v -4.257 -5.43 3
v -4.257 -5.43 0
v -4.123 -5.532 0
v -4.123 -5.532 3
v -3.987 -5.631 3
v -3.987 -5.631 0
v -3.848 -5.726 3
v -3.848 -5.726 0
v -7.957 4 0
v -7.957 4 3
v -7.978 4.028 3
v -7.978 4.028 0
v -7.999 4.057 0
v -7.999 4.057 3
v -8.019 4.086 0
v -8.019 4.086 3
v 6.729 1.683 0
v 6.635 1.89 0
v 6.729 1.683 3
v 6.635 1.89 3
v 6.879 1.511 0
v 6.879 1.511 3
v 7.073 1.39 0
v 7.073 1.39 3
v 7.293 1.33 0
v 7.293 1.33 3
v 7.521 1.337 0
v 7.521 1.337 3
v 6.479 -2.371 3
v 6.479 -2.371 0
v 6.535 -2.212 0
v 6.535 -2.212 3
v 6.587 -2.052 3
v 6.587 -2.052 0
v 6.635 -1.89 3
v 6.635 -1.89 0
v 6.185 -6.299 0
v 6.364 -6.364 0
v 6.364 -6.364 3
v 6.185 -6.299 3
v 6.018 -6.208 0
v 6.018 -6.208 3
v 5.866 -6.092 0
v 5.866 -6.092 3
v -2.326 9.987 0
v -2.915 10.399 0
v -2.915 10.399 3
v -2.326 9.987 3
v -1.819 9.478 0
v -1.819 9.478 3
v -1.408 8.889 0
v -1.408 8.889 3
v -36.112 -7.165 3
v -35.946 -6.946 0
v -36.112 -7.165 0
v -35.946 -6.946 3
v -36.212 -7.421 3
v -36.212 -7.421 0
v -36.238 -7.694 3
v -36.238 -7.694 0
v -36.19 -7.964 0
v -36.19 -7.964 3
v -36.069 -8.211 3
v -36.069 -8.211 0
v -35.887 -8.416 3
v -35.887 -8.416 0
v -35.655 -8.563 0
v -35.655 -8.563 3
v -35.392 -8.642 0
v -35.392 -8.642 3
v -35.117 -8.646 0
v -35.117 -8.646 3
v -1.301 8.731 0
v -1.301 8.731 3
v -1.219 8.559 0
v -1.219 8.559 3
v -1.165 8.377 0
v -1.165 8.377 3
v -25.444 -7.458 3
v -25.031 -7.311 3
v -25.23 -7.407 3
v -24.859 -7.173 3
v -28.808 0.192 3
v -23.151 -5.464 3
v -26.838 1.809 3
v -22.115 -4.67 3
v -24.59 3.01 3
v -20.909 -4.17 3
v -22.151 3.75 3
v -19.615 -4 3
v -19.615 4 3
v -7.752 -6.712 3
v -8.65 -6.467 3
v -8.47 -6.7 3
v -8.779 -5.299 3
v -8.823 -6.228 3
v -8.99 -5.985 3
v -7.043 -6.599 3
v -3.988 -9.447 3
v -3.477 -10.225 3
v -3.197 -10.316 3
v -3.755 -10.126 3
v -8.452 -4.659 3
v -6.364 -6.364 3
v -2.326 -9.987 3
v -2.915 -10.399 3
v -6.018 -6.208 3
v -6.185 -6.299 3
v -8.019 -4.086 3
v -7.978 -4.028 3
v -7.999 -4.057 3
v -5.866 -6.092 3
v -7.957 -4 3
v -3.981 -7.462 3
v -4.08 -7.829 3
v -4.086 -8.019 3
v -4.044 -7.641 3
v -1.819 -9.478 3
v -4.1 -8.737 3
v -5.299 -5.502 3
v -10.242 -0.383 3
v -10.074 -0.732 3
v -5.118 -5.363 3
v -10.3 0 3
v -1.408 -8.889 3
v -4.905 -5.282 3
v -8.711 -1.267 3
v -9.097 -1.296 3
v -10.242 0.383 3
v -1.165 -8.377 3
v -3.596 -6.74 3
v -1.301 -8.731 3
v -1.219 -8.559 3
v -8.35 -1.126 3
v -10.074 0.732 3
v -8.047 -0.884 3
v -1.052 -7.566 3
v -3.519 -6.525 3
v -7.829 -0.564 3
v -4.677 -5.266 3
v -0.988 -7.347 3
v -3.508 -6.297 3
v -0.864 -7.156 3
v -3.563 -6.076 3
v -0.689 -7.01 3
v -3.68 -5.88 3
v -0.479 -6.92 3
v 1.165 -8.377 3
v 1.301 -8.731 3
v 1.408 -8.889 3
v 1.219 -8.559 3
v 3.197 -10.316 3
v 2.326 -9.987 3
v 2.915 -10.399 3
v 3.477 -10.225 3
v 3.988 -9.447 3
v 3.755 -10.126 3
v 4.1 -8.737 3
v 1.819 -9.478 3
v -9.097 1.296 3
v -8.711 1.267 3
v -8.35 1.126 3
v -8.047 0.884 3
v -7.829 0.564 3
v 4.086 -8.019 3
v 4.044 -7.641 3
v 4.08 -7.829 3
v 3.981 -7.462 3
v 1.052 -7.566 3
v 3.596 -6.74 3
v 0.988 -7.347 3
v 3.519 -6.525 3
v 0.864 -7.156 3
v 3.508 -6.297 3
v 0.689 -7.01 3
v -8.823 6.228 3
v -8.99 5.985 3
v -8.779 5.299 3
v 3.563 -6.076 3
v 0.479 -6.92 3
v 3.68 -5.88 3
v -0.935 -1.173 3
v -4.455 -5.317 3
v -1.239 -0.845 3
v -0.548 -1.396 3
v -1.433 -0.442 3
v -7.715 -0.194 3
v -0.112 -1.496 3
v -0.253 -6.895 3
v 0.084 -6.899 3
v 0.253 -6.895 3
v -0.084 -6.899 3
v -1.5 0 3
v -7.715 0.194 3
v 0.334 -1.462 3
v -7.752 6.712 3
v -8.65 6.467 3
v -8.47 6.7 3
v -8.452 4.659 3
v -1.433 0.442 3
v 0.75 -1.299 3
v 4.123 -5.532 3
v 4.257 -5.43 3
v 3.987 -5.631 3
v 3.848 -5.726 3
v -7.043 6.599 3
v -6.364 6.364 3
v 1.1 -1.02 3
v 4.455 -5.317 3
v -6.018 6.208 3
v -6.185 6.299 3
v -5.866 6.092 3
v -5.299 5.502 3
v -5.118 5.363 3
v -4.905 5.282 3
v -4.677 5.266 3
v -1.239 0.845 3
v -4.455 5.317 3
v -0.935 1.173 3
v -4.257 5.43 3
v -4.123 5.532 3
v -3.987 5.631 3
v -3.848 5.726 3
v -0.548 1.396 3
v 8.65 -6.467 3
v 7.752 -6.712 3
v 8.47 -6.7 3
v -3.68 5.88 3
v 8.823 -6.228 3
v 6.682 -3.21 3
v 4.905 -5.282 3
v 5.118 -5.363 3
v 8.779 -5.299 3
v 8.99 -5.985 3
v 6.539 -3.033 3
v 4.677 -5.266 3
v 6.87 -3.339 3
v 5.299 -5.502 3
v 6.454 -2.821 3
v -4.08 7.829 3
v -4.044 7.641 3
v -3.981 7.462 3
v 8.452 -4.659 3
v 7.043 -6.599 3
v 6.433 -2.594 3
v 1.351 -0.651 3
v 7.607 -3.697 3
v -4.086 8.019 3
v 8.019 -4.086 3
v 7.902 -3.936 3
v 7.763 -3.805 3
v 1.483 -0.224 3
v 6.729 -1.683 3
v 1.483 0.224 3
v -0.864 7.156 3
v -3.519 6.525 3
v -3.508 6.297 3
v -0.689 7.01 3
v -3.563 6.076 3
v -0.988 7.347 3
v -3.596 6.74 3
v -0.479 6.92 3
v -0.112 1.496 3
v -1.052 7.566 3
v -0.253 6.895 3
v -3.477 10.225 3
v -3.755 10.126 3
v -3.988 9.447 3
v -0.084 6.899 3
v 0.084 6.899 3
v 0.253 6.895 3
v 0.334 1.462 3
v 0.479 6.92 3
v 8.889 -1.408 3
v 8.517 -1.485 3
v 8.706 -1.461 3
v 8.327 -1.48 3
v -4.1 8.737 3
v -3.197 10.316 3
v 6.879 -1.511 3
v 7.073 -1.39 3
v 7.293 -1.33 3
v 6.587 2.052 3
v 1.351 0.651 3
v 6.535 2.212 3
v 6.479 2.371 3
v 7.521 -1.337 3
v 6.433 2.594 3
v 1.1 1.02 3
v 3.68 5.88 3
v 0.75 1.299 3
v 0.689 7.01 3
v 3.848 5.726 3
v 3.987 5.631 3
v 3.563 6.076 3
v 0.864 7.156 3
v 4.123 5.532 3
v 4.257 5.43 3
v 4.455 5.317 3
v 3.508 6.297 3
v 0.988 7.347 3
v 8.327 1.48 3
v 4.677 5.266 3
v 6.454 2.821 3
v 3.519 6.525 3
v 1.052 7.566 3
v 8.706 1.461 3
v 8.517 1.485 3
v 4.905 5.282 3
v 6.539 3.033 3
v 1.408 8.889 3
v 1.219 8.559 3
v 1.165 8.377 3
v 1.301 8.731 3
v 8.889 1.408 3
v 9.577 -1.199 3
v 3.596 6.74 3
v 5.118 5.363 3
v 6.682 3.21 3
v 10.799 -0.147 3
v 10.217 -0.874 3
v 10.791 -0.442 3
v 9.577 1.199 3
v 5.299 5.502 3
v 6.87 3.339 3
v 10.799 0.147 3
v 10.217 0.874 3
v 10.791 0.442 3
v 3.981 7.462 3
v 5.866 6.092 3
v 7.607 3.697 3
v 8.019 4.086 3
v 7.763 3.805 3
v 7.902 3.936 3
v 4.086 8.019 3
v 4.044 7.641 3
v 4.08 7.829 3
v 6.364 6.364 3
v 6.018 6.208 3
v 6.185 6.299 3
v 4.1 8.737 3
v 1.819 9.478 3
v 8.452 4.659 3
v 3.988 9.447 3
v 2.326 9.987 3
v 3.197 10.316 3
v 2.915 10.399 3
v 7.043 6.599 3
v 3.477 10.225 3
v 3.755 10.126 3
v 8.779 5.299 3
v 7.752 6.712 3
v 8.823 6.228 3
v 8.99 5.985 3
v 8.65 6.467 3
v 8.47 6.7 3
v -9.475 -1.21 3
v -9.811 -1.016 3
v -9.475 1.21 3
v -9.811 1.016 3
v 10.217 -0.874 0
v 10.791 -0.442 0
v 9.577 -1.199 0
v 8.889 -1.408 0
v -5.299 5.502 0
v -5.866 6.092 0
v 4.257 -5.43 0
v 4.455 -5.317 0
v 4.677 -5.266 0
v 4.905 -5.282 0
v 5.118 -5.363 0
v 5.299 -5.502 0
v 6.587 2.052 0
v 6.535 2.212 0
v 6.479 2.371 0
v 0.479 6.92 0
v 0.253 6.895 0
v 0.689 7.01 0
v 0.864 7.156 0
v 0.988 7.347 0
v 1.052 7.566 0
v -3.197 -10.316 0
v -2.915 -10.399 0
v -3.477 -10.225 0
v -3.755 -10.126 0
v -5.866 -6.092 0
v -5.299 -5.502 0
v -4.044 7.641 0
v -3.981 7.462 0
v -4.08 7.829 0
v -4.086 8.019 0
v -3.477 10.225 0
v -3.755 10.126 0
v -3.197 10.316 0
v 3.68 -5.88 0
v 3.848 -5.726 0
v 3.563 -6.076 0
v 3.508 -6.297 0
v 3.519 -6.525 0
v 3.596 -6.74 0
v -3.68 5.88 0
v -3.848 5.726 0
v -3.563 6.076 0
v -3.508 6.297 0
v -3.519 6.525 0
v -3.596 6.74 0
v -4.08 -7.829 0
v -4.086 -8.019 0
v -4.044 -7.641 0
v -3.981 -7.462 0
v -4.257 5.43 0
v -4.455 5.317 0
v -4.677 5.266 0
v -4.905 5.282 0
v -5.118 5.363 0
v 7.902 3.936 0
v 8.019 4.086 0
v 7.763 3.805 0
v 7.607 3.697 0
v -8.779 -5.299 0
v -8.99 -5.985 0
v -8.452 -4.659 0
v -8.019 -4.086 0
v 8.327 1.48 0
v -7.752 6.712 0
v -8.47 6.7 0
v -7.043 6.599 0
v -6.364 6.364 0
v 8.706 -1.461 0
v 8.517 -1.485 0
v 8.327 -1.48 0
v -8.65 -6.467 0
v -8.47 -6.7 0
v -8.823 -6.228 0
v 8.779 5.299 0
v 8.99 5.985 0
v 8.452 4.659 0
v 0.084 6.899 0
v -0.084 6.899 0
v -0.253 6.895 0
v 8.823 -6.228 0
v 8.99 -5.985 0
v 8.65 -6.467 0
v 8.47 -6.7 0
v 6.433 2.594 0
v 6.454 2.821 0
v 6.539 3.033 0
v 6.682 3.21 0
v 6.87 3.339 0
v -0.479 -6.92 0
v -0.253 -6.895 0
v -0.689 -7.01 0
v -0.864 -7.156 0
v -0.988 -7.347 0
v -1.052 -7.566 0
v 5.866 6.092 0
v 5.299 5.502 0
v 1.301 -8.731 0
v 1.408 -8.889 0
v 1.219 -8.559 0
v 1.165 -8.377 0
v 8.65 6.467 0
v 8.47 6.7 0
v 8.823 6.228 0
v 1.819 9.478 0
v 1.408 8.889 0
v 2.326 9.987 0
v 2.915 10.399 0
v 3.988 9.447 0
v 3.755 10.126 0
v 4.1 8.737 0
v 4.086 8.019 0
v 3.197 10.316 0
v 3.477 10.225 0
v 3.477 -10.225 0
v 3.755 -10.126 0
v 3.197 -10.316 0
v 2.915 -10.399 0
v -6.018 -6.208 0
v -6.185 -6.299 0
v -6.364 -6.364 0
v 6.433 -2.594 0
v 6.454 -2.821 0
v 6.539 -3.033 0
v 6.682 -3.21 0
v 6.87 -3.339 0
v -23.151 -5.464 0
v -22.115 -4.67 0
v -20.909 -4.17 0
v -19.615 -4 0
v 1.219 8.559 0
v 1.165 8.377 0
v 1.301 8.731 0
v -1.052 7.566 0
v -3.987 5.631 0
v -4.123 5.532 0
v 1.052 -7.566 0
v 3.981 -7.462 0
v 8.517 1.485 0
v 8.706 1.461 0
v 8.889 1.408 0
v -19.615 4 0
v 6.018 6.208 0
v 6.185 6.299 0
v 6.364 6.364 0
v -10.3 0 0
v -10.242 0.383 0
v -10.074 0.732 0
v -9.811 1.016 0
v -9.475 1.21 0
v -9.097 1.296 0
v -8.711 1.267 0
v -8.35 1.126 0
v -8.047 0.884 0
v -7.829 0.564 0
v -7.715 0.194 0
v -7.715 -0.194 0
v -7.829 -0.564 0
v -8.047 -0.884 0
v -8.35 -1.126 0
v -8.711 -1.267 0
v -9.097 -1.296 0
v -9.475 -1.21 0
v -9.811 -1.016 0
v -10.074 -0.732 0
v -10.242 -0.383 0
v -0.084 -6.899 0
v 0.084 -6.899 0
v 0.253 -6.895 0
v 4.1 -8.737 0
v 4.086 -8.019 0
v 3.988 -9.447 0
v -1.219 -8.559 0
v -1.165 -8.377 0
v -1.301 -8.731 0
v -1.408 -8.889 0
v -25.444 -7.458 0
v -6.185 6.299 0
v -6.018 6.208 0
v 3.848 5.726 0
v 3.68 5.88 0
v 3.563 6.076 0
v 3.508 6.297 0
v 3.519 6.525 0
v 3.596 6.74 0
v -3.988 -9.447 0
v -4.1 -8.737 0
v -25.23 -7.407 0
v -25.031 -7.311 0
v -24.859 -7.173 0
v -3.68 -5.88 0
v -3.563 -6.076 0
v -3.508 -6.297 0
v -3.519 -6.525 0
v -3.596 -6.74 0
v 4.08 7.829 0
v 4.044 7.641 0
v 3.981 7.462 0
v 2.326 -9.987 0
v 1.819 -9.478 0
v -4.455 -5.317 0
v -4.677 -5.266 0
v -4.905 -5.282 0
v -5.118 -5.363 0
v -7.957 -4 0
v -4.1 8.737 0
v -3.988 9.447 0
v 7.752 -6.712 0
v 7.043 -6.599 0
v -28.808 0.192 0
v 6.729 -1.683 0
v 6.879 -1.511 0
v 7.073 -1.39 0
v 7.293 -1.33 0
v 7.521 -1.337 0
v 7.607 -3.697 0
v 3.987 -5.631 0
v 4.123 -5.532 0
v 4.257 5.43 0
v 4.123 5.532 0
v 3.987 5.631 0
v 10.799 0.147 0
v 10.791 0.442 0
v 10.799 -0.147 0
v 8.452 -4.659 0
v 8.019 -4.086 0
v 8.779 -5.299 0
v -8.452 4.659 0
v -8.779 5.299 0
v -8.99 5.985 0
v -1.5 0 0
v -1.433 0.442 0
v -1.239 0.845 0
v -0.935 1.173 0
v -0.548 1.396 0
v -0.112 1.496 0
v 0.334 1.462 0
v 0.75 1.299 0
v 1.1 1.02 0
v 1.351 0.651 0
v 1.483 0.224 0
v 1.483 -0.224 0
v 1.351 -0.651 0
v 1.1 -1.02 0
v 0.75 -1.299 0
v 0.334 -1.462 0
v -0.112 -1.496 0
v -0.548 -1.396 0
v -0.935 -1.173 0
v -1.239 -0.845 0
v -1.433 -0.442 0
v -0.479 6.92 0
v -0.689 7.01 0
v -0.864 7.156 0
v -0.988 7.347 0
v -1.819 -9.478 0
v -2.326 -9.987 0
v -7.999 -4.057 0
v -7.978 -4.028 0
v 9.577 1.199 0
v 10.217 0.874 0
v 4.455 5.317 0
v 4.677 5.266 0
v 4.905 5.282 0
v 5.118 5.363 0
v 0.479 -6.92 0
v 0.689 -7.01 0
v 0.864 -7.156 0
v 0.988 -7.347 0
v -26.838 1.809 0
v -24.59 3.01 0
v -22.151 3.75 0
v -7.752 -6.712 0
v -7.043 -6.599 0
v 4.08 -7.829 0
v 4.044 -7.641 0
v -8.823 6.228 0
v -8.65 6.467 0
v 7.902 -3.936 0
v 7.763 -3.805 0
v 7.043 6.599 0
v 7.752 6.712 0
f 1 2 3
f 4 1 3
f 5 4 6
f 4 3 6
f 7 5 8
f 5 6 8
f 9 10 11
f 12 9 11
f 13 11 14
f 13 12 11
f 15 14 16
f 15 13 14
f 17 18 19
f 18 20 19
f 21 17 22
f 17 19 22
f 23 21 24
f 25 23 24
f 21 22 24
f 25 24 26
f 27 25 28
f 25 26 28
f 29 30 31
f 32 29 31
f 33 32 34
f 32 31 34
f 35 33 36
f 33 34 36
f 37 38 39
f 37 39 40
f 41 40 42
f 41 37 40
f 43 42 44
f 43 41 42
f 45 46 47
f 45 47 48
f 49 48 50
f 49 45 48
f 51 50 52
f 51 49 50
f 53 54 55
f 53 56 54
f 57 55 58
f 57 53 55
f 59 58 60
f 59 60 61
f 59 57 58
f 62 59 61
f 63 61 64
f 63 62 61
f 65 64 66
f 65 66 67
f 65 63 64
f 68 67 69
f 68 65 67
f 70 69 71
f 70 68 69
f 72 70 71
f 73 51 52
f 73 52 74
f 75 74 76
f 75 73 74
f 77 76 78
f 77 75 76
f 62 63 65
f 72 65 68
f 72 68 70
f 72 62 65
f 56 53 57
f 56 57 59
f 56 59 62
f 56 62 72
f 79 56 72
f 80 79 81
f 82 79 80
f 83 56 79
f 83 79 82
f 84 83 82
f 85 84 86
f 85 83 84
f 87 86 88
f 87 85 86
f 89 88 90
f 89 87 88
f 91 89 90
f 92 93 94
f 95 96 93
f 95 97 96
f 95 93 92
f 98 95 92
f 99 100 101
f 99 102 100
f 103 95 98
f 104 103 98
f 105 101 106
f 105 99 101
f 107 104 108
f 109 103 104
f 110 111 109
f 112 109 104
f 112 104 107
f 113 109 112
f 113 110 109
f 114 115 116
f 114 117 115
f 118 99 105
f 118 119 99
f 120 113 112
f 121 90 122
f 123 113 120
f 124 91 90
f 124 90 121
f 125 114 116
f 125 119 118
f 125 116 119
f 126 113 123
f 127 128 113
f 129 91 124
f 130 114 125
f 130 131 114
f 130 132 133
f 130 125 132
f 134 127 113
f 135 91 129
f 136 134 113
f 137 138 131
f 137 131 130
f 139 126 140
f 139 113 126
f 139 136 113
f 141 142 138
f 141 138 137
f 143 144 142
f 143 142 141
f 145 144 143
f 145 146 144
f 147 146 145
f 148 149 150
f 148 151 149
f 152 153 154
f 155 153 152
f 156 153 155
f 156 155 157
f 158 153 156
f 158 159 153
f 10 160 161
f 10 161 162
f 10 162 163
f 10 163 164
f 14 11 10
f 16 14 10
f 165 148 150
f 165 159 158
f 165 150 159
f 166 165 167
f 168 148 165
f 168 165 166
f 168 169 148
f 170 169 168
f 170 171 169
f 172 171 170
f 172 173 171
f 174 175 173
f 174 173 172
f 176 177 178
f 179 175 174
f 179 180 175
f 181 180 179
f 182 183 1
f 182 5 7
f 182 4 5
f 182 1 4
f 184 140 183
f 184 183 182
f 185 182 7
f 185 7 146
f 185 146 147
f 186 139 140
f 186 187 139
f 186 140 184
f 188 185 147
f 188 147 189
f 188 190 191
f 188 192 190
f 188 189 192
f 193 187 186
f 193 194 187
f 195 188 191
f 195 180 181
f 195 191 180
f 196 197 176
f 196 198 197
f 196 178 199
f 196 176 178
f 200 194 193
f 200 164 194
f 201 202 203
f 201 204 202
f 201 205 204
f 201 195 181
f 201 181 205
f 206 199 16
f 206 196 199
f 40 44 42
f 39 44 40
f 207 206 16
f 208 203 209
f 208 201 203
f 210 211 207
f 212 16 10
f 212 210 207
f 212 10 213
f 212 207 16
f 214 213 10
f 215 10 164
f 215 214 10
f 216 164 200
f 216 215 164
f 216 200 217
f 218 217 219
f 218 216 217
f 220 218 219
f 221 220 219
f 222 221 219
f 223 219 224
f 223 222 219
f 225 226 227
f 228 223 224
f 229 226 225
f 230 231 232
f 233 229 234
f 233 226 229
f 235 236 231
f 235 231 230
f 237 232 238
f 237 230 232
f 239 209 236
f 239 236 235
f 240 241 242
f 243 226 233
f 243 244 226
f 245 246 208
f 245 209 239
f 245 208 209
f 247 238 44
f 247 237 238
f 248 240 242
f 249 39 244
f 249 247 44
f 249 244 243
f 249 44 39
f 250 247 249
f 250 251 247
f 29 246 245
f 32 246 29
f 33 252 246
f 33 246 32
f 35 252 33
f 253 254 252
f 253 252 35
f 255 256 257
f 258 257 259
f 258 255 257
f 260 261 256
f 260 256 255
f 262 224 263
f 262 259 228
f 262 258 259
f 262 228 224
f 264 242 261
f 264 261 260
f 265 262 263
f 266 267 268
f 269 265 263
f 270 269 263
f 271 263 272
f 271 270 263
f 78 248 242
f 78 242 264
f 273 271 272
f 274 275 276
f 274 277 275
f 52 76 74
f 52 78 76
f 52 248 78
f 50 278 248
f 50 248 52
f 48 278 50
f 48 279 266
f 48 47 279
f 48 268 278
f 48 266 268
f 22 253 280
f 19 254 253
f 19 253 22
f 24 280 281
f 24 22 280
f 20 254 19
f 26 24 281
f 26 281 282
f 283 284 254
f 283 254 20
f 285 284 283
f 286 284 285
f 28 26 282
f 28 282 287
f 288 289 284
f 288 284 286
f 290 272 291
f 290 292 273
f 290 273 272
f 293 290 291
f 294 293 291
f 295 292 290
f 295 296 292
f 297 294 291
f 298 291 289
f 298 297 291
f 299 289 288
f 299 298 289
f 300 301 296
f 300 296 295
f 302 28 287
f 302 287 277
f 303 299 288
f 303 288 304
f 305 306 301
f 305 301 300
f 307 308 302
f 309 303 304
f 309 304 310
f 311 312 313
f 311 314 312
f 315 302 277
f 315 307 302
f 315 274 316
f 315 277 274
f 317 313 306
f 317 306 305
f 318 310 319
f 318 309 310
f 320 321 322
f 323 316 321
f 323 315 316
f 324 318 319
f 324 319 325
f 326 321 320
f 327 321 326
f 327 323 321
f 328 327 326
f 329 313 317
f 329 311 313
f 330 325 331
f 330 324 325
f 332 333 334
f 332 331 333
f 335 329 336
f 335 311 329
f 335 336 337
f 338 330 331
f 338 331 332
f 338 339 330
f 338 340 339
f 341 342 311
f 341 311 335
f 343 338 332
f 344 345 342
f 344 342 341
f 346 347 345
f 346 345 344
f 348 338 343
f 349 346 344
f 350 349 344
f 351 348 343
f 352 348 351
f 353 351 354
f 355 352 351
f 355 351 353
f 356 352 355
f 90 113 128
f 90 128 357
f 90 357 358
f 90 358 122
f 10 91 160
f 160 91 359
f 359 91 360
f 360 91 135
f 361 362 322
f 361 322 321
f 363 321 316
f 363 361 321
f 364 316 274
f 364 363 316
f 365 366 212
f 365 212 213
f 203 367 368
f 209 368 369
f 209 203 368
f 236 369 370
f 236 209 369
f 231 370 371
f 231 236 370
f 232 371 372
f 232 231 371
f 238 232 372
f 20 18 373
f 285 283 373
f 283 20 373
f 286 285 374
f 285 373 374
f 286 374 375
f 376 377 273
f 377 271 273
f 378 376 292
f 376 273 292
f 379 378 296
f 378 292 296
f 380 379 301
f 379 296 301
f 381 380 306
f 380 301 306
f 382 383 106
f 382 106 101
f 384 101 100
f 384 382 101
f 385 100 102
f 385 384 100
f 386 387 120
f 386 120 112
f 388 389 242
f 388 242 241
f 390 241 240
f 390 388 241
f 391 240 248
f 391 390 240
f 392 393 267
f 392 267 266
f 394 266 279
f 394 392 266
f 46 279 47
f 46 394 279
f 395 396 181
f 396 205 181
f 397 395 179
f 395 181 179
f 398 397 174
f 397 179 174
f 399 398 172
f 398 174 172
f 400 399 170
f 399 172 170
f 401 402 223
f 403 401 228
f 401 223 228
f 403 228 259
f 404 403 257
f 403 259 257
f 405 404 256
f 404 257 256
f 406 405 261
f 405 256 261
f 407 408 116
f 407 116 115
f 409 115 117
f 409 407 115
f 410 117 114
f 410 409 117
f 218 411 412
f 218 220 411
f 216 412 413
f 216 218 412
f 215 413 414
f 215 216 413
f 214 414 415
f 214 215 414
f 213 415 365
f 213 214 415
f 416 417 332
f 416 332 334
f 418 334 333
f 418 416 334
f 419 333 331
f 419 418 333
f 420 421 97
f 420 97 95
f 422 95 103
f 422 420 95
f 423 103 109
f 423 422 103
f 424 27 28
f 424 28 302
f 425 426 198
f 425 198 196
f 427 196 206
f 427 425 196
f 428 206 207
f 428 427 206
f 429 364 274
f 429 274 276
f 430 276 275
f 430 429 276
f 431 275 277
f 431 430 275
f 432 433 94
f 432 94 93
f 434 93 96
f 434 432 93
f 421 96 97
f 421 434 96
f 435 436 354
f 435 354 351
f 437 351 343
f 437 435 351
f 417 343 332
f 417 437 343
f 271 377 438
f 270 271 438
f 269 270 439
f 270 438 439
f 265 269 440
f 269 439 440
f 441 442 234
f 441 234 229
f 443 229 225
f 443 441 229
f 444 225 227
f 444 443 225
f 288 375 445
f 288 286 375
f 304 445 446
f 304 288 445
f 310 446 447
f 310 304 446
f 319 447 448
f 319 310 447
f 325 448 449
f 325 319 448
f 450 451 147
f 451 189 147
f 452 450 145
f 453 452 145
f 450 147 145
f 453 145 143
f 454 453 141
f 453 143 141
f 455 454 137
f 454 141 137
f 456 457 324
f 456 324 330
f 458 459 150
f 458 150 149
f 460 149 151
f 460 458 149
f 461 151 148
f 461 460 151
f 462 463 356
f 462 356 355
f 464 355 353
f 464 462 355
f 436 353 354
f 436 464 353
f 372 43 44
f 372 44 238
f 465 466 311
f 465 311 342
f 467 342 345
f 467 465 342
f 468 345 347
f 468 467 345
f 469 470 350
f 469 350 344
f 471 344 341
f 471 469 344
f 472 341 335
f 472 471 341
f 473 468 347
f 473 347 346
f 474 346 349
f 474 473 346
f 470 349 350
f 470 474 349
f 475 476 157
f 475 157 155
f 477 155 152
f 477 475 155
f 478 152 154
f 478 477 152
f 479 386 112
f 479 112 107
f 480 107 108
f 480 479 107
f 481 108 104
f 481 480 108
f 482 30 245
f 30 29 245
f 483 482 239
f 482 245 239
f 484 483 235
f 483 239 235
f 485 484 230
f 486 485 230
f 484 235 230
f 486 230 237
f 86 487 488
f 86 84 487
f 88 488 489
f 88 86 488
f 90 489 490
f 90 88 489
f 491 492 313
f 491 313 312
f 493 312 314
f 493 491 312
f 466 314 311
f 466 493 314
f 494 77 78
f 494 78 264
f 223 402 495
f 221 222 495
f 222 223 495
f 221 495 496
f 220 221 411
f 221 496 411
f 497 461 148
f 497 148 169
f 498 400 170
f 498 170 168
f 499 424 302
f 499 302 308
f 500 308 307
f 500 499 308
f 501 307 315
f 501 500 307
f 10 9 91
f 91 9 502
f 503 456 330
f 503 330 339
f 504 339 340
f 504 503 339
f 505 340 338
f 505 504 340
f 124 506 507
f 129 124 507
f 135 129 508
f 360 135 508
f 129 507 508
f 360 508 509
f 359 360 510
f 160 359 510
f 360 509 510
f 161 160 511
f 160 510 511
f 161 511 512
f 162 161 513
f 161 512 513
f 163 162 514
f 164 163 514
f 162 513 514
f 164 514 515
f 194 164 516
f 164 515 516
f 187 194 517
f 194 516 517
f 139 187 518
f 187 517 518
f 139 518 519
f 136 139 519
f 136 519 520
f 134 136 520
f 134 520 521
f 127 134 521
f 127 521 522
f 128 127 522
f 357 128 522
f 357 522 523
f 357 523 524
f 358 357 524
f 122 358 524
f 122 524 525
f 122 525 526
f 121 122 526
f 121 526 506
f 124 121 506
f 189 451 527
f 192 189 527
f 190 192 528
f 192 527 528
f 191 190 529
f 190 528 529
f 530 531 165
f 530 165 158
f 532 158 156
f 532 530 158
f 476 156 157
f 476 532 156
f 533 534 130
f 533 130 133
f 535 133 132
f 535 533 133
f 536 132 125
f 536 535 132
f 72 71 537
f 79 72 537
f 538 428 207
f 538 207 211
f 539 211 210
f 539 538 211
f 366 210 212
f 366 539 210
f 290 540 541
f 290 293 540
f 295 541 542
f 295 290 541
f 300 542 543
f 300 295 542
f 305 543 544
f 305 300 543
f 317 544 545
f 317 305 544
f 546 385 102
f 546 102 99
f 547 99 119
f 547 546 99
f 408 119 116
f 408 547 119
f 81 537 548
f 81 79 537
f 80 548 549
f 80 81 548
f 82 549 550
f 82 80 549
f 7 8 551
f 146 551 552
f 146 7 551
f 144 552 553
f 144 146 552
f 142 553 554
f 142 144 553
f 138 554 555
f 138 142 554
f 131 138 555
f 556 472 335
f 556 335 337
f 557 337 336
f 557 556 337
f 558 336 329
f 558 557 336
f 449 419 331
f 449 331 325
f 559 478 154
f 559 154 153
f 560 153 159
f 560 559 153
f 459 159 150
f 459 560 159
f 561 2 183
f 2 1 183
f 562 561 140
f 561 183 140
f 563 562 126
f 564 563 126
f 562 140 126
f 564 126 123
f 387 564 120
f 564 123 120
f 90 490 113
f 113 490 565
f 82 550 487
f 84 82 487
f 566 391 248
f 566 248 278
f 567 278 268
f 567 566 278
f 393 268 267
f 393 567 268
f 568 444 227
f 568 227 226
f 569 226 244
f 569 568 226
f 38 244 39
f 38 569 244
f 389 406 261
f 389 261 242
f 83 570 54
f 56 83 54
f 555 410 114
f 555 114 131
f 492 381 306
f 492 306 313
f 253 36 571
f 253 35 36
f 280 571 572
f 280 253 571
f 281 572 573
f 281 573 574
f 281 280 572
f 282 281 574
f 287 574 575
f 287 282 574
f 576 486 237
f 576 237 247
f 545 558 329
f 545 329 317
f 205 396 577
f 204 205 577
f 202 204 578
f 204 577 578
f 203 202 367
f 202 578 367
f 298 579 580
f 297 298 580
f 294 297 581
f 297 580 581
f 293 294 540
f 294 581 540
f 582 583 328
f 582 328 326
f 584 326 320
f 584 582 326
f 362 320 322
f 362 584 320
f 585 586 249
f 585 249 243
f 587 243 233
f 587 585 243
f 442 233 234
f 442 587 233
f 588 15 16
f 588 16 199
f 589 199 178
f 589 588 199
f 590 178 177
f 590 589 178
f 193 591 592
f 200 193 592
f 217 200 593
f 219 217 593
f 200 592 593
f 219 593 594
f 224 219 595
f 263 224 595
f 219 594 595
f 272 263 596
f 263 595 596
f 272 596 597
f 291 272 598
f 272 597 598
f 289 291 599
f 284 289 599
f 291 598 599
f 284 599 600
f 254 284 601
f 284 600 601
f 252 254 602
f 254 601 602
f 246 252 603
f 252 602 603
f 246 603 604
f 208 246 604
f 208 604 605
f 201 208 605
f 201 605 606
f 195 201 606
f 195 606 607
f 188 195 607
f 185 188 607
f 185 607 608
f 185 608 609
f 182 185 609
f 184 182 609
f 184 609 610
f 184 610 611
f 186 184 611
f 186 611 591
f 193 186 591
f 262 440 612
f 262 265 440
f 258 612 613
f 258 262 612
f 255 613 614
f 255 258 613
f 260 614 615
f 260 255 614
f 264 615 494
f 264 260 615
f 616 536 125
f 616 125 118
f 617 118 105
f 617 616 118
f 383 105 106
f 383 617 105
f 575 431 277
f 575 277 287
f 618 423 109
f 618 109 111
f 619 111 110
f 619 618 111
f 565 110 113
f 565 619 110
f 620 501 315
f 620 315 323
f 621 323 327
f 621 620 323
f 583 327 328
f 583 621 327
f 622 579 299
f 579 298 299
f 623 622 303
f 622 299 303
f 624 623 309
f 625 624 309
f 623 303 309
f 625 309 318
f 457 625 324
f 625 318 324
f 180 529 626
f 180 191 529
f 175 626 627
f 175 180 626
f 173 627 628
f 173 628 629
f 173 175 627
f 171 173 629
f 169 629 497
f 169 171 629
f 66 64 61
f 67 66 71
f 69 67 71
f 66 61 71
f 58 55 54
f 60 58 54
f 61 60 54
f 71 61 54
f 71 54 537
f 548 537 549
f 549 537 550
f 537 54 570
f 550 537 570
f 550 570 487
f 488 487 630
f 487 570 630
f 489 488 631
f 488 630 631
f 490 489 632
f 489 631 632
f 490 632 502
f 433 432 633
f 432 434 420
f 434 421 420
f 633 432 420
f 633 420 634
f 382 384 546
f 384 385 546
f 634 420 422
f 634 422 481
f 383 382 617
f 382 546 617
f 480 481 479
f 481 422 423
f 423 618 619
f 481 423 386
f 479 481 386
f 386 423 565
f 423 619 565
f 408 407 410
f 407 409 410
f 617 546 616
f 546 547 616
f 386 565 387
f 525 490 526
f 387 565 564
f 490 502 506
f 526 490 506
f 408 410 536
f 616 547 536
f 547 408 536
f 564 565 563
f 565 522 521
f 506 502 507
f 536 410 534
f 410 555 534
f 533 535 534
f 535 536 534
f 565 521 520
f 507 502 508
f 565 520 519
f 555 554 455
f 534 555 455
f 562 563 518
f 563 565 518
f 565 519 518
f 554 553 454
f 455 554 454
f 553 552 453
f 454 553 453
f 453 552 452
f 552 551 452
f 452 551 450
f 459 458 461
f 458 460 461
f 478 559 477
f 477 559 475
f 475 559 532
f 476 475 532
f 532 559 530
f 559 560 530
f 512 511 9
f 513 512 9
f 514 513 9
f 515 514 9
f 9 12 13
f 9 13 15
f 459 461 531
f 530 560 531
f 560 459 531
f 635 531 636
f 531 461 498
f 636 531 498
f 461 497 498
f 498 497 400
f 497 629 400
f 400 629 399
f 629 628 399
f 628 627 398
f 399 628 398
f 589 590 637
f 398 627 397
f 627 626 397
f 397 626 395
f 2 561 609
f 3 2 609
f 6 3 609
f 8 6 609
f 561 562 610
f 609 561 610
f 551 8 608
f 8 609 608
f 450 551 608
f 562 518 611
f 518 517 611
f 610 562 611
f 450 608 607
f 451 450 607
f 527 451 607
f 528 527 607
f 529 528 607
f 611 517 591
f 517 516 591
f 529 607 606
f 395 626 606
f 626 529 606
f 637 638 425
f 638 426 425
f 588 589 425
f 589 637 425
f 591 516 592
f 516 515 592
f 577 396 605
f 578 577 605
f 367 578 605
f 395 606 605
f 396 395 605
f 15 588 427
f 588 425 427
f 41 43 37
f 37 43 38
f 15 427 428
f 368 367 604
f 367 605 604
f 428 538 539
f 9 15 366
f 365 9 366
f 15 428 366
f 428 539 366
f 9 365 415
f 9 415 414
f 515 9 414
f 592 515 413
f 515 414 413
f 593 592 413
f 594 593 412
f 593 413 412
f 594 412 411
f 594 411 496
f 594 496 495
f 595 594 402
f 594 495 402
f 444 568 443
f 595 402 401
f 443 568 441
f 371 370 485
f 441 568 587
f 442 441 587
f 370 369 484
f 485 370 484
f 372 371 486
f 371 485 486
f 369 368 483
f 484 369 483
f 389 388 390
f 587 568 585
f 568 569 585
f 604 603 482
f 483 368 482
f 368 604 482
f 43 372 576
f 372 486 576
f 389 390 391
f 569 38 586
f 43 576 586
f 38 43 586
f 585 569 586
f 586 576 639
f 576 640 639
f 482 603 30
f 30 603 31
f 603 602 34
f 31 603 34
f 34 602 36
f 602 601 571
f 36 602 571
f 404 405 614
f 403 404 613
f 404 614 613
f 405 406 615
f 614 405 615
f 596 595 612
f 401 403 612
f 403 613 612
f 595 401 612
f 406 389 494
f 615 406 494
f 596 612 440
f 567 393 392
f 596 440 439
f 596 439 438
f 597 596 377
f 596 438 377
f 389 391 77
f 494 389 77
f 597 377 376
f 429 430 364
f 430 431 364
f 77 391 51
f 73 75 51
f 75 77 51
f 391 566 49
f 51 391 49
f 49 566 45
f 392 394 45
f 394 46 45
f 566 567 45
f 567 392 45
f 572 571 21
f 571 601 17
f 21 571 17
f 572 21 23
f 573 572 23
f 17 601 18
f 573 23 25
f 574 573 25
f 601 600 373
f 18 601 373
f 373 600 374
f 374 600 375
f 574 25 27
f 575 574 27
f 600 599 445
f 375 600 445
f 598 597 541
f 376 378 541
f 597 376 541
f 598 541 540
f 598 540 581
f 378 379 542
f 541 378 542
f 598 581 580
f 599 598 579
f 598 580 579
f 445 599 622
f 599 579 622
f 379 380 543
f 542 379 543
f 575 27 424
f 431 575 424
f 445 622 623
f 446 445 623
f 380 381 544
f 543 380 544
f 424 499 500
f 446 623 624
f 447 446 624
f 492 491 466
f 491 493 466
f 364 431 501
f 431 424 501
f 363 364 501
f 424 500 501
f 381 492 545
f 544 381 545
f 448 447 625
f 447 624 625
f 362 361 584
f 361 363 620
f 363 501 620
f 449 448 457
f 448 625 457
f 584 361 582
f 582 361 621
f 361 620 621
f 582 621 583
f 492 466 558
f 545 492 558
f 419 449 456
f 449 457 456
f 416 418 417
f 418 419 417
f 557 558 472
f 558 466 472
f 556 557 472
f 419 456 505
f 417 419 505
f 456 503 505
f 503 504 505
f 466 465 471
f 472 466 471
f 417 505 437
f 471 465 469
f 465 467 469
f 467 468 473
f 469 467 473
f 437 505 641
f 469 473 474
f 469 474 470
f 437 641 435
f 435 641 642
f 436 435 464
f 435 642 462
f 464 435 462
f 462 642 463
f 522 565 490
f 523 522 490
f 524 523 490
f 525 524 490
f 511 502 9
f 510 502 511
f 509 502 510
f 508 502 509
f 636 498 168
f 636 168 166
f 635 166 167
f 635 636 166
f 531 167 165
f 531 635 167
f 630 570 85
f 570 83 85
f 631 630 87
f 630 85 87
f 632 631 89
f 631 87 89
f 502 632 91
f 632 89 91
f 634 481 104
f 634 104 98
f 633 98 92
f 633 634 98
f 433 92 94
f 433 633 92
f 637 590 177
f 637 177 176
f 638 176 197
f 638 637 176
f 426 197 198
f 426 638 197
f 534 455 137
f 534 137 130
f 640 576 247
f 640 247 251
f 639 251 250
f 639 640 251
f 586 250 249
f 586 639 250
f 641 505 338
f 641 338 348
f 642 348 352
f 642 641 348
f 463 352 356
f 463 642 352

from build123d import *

# Parameters (mm, degrees)
POSICIONAMENTOS_R               = 6.8994
BASE_DEPTH                      = 3
BASE_DENTE_DEPTH                = 3
RAIO_DENTE_R                    = 0.778916794
PADR_OCIRCULAR1_COUNT           = 10
RAIO_DENTE_OF_PADR_OCIRCULAR1_R = 0.778916794
RESSALTO_EXTRUS_O3_DEPTH        = 3
FURO_DE_DI_METRO_3_0_3_1_D      = 3
FURO_DE_DI_METRO_2_6_2_6_1_D    = 2.6
FILETE2_R                       = 5
FILETE3_R                       = 13
FILETE4_R                       = 1


with BuildPart() as part:
    # Posicionamentos → Base (new body)
    with BuildSketch(Plane.XY):
        Circle(POSICIONAMENTOS_R)
    extrude(amount=BASE_DEPTH)

    # Dente → Base Dente (add, through all)
    with BuildSketch(Plane.XY):
        with BuildLine():
            Line((-1.165278514, 8.376570058), (-0.950632674, 6.833594799))
            ThreePointArc((-0.950632674, 6.833594799), (-2.132031851, 6.561719329), (-3.247608255, 6.087262191))
            Line((-3.247608255, 6.087262191), (-3.980894224, 7.461721056))
            ThreePointArc((-3.980894224, 7.461721056), (-4.065642913, 7.734315111), (-4.085914498, 8.019058718))
            ThreePointArc((-4.085914498, 8.019058718), (-4.059577631, 9.094601045), (-3.754624591, 10.126341599))
            ThreePointArc((-3.754624591, 10.126341599), (-3.337383539, 10.271410376), (-2.91455915, 10.399295407))
            ThreePointArc((-2.91455915, 10.399295407), (-2.061405076, 9.743846664), (-1.407910185, 8.889195065))
            ThreePointArc((-1.407910185, 8.889195065), (-1.256942149, 8.64691731), (-1.165278514, 8.376570058))
        make_face()
    base_dente = extrude(amount=BASE_DENTE_DEPTH)

    # Raio Dente
    raio_dente_edges = [part.edges().sort_by_distance(p)[0] for p in [
        (-3.247608255, 6.087262191, 1.5),
        (-0.950632674, 6.833594799, 1.5),
    ]]
    fillet(raio_dente_edges, radius=RAIO_DENTE_R)

    # PadrãoCircular1: Base Dente ×10 about axis, 1 skipped
    padr_ocircular1_axis = Axis((0, 0, 0), (0, 0, -1))
    add([base_dente.rotate(padr_ocircular1_axis, i * 360 / PADR_OCIRCULAR1_COUNT) for i in range(1, PADR_OCIRCULAR1_COUNT) if i not in (8,)])

    # Raio Dente of PadrãoCircular1
    raio_dente_of_padr_ocircular1_edges = [part.edges().sort_by_distance(p)[0] for p in [
        (0.950632674, 6.833594799, 1.5),
        (3.247608255, 6.087262191, 1.5),
        (4.785764232, 4.969726459, 1.5),
        (6.205373212, 3.015802325, 1.5),
        (6.792896515, 1.207591527, 1.5),
        (6.792896515, -1.207591527, 1.5),
        (6.205373212, -3.015802325, 1.5),
        (4.785764232, -4.969726459, 1.5),
        (3.247608255, -6.087262191, 1.5),
        (0.950632674, -6.833594799, 1.5),
        (-0.950632674, -6.833594799, 1.5),
        (-3.247608255, -6.087262191, 1.5),
        (-4.785764232, -4.969726459, 1.5),
        (-6.205373212, -3.015802325, 1.5),
        (-6.205373212, 3.015802325, 1.5),
        (-4.785764232, 4.969726459, 1.5),
    ]]
    fillet(raio_dente_of_padr_ocircular1_edges, radius=RAIO_DENTE_OF_PADR_OCIRCULAR1_R)

    # Braço → Ressalto-extrusão3 (add, through all)
    with BuildSketch(Plane.XY):
        Polygon((0, 4), (-25, 4), (-38, -9), (-25.102702489, -7.416410988), (-21.686291501, -4), (0, -4), align=None)
    extrude(amount=RESSALTO_EXTRUS_O3_DEPTH)

    # Furo de diâmetro Ø3.0 (3)1 (through all)
    with Locations(Plane.XY.offset(3)):
        with Locations((0, 0)):
            Hole(FURO_DE_DI_METRO_3_0_3_1_D / 2)

    # Furo de diâmetro Ø2.6 (2.6)1 (through all)
    with Locations(Plane.XY.offset(3)):
        with Locations((-9, 0)):
            Hole(FURO_DE_DI_METRO_2_6_2_6_1_D / 2)

    # Filete2
    filete2_edges = [part.edges().sort_by_distance(p)[0] for p in [
        (-21.686291501, -4, 1.5),
    ]]
    fillet(filete2_edges, radius=FILETE2_R)

    # Filete3
    filete3_edges = [part.edges().sort_by_distance(p)[0] for p in [
        (-25, 4, 1.5),
    ]]
    fillet(filete3_edges, radius=FILETE3_R)

    # Filete4
    filete4_edges = [part.edges().sort_by_distance(p)[0] for p in [
        (-25.102702489, -7.416410988, 1.5),
        (-38, -9, 1.5),
    ]]
    fillet(filete4_edges, radius=FILETE4_R)


solid = part.part
